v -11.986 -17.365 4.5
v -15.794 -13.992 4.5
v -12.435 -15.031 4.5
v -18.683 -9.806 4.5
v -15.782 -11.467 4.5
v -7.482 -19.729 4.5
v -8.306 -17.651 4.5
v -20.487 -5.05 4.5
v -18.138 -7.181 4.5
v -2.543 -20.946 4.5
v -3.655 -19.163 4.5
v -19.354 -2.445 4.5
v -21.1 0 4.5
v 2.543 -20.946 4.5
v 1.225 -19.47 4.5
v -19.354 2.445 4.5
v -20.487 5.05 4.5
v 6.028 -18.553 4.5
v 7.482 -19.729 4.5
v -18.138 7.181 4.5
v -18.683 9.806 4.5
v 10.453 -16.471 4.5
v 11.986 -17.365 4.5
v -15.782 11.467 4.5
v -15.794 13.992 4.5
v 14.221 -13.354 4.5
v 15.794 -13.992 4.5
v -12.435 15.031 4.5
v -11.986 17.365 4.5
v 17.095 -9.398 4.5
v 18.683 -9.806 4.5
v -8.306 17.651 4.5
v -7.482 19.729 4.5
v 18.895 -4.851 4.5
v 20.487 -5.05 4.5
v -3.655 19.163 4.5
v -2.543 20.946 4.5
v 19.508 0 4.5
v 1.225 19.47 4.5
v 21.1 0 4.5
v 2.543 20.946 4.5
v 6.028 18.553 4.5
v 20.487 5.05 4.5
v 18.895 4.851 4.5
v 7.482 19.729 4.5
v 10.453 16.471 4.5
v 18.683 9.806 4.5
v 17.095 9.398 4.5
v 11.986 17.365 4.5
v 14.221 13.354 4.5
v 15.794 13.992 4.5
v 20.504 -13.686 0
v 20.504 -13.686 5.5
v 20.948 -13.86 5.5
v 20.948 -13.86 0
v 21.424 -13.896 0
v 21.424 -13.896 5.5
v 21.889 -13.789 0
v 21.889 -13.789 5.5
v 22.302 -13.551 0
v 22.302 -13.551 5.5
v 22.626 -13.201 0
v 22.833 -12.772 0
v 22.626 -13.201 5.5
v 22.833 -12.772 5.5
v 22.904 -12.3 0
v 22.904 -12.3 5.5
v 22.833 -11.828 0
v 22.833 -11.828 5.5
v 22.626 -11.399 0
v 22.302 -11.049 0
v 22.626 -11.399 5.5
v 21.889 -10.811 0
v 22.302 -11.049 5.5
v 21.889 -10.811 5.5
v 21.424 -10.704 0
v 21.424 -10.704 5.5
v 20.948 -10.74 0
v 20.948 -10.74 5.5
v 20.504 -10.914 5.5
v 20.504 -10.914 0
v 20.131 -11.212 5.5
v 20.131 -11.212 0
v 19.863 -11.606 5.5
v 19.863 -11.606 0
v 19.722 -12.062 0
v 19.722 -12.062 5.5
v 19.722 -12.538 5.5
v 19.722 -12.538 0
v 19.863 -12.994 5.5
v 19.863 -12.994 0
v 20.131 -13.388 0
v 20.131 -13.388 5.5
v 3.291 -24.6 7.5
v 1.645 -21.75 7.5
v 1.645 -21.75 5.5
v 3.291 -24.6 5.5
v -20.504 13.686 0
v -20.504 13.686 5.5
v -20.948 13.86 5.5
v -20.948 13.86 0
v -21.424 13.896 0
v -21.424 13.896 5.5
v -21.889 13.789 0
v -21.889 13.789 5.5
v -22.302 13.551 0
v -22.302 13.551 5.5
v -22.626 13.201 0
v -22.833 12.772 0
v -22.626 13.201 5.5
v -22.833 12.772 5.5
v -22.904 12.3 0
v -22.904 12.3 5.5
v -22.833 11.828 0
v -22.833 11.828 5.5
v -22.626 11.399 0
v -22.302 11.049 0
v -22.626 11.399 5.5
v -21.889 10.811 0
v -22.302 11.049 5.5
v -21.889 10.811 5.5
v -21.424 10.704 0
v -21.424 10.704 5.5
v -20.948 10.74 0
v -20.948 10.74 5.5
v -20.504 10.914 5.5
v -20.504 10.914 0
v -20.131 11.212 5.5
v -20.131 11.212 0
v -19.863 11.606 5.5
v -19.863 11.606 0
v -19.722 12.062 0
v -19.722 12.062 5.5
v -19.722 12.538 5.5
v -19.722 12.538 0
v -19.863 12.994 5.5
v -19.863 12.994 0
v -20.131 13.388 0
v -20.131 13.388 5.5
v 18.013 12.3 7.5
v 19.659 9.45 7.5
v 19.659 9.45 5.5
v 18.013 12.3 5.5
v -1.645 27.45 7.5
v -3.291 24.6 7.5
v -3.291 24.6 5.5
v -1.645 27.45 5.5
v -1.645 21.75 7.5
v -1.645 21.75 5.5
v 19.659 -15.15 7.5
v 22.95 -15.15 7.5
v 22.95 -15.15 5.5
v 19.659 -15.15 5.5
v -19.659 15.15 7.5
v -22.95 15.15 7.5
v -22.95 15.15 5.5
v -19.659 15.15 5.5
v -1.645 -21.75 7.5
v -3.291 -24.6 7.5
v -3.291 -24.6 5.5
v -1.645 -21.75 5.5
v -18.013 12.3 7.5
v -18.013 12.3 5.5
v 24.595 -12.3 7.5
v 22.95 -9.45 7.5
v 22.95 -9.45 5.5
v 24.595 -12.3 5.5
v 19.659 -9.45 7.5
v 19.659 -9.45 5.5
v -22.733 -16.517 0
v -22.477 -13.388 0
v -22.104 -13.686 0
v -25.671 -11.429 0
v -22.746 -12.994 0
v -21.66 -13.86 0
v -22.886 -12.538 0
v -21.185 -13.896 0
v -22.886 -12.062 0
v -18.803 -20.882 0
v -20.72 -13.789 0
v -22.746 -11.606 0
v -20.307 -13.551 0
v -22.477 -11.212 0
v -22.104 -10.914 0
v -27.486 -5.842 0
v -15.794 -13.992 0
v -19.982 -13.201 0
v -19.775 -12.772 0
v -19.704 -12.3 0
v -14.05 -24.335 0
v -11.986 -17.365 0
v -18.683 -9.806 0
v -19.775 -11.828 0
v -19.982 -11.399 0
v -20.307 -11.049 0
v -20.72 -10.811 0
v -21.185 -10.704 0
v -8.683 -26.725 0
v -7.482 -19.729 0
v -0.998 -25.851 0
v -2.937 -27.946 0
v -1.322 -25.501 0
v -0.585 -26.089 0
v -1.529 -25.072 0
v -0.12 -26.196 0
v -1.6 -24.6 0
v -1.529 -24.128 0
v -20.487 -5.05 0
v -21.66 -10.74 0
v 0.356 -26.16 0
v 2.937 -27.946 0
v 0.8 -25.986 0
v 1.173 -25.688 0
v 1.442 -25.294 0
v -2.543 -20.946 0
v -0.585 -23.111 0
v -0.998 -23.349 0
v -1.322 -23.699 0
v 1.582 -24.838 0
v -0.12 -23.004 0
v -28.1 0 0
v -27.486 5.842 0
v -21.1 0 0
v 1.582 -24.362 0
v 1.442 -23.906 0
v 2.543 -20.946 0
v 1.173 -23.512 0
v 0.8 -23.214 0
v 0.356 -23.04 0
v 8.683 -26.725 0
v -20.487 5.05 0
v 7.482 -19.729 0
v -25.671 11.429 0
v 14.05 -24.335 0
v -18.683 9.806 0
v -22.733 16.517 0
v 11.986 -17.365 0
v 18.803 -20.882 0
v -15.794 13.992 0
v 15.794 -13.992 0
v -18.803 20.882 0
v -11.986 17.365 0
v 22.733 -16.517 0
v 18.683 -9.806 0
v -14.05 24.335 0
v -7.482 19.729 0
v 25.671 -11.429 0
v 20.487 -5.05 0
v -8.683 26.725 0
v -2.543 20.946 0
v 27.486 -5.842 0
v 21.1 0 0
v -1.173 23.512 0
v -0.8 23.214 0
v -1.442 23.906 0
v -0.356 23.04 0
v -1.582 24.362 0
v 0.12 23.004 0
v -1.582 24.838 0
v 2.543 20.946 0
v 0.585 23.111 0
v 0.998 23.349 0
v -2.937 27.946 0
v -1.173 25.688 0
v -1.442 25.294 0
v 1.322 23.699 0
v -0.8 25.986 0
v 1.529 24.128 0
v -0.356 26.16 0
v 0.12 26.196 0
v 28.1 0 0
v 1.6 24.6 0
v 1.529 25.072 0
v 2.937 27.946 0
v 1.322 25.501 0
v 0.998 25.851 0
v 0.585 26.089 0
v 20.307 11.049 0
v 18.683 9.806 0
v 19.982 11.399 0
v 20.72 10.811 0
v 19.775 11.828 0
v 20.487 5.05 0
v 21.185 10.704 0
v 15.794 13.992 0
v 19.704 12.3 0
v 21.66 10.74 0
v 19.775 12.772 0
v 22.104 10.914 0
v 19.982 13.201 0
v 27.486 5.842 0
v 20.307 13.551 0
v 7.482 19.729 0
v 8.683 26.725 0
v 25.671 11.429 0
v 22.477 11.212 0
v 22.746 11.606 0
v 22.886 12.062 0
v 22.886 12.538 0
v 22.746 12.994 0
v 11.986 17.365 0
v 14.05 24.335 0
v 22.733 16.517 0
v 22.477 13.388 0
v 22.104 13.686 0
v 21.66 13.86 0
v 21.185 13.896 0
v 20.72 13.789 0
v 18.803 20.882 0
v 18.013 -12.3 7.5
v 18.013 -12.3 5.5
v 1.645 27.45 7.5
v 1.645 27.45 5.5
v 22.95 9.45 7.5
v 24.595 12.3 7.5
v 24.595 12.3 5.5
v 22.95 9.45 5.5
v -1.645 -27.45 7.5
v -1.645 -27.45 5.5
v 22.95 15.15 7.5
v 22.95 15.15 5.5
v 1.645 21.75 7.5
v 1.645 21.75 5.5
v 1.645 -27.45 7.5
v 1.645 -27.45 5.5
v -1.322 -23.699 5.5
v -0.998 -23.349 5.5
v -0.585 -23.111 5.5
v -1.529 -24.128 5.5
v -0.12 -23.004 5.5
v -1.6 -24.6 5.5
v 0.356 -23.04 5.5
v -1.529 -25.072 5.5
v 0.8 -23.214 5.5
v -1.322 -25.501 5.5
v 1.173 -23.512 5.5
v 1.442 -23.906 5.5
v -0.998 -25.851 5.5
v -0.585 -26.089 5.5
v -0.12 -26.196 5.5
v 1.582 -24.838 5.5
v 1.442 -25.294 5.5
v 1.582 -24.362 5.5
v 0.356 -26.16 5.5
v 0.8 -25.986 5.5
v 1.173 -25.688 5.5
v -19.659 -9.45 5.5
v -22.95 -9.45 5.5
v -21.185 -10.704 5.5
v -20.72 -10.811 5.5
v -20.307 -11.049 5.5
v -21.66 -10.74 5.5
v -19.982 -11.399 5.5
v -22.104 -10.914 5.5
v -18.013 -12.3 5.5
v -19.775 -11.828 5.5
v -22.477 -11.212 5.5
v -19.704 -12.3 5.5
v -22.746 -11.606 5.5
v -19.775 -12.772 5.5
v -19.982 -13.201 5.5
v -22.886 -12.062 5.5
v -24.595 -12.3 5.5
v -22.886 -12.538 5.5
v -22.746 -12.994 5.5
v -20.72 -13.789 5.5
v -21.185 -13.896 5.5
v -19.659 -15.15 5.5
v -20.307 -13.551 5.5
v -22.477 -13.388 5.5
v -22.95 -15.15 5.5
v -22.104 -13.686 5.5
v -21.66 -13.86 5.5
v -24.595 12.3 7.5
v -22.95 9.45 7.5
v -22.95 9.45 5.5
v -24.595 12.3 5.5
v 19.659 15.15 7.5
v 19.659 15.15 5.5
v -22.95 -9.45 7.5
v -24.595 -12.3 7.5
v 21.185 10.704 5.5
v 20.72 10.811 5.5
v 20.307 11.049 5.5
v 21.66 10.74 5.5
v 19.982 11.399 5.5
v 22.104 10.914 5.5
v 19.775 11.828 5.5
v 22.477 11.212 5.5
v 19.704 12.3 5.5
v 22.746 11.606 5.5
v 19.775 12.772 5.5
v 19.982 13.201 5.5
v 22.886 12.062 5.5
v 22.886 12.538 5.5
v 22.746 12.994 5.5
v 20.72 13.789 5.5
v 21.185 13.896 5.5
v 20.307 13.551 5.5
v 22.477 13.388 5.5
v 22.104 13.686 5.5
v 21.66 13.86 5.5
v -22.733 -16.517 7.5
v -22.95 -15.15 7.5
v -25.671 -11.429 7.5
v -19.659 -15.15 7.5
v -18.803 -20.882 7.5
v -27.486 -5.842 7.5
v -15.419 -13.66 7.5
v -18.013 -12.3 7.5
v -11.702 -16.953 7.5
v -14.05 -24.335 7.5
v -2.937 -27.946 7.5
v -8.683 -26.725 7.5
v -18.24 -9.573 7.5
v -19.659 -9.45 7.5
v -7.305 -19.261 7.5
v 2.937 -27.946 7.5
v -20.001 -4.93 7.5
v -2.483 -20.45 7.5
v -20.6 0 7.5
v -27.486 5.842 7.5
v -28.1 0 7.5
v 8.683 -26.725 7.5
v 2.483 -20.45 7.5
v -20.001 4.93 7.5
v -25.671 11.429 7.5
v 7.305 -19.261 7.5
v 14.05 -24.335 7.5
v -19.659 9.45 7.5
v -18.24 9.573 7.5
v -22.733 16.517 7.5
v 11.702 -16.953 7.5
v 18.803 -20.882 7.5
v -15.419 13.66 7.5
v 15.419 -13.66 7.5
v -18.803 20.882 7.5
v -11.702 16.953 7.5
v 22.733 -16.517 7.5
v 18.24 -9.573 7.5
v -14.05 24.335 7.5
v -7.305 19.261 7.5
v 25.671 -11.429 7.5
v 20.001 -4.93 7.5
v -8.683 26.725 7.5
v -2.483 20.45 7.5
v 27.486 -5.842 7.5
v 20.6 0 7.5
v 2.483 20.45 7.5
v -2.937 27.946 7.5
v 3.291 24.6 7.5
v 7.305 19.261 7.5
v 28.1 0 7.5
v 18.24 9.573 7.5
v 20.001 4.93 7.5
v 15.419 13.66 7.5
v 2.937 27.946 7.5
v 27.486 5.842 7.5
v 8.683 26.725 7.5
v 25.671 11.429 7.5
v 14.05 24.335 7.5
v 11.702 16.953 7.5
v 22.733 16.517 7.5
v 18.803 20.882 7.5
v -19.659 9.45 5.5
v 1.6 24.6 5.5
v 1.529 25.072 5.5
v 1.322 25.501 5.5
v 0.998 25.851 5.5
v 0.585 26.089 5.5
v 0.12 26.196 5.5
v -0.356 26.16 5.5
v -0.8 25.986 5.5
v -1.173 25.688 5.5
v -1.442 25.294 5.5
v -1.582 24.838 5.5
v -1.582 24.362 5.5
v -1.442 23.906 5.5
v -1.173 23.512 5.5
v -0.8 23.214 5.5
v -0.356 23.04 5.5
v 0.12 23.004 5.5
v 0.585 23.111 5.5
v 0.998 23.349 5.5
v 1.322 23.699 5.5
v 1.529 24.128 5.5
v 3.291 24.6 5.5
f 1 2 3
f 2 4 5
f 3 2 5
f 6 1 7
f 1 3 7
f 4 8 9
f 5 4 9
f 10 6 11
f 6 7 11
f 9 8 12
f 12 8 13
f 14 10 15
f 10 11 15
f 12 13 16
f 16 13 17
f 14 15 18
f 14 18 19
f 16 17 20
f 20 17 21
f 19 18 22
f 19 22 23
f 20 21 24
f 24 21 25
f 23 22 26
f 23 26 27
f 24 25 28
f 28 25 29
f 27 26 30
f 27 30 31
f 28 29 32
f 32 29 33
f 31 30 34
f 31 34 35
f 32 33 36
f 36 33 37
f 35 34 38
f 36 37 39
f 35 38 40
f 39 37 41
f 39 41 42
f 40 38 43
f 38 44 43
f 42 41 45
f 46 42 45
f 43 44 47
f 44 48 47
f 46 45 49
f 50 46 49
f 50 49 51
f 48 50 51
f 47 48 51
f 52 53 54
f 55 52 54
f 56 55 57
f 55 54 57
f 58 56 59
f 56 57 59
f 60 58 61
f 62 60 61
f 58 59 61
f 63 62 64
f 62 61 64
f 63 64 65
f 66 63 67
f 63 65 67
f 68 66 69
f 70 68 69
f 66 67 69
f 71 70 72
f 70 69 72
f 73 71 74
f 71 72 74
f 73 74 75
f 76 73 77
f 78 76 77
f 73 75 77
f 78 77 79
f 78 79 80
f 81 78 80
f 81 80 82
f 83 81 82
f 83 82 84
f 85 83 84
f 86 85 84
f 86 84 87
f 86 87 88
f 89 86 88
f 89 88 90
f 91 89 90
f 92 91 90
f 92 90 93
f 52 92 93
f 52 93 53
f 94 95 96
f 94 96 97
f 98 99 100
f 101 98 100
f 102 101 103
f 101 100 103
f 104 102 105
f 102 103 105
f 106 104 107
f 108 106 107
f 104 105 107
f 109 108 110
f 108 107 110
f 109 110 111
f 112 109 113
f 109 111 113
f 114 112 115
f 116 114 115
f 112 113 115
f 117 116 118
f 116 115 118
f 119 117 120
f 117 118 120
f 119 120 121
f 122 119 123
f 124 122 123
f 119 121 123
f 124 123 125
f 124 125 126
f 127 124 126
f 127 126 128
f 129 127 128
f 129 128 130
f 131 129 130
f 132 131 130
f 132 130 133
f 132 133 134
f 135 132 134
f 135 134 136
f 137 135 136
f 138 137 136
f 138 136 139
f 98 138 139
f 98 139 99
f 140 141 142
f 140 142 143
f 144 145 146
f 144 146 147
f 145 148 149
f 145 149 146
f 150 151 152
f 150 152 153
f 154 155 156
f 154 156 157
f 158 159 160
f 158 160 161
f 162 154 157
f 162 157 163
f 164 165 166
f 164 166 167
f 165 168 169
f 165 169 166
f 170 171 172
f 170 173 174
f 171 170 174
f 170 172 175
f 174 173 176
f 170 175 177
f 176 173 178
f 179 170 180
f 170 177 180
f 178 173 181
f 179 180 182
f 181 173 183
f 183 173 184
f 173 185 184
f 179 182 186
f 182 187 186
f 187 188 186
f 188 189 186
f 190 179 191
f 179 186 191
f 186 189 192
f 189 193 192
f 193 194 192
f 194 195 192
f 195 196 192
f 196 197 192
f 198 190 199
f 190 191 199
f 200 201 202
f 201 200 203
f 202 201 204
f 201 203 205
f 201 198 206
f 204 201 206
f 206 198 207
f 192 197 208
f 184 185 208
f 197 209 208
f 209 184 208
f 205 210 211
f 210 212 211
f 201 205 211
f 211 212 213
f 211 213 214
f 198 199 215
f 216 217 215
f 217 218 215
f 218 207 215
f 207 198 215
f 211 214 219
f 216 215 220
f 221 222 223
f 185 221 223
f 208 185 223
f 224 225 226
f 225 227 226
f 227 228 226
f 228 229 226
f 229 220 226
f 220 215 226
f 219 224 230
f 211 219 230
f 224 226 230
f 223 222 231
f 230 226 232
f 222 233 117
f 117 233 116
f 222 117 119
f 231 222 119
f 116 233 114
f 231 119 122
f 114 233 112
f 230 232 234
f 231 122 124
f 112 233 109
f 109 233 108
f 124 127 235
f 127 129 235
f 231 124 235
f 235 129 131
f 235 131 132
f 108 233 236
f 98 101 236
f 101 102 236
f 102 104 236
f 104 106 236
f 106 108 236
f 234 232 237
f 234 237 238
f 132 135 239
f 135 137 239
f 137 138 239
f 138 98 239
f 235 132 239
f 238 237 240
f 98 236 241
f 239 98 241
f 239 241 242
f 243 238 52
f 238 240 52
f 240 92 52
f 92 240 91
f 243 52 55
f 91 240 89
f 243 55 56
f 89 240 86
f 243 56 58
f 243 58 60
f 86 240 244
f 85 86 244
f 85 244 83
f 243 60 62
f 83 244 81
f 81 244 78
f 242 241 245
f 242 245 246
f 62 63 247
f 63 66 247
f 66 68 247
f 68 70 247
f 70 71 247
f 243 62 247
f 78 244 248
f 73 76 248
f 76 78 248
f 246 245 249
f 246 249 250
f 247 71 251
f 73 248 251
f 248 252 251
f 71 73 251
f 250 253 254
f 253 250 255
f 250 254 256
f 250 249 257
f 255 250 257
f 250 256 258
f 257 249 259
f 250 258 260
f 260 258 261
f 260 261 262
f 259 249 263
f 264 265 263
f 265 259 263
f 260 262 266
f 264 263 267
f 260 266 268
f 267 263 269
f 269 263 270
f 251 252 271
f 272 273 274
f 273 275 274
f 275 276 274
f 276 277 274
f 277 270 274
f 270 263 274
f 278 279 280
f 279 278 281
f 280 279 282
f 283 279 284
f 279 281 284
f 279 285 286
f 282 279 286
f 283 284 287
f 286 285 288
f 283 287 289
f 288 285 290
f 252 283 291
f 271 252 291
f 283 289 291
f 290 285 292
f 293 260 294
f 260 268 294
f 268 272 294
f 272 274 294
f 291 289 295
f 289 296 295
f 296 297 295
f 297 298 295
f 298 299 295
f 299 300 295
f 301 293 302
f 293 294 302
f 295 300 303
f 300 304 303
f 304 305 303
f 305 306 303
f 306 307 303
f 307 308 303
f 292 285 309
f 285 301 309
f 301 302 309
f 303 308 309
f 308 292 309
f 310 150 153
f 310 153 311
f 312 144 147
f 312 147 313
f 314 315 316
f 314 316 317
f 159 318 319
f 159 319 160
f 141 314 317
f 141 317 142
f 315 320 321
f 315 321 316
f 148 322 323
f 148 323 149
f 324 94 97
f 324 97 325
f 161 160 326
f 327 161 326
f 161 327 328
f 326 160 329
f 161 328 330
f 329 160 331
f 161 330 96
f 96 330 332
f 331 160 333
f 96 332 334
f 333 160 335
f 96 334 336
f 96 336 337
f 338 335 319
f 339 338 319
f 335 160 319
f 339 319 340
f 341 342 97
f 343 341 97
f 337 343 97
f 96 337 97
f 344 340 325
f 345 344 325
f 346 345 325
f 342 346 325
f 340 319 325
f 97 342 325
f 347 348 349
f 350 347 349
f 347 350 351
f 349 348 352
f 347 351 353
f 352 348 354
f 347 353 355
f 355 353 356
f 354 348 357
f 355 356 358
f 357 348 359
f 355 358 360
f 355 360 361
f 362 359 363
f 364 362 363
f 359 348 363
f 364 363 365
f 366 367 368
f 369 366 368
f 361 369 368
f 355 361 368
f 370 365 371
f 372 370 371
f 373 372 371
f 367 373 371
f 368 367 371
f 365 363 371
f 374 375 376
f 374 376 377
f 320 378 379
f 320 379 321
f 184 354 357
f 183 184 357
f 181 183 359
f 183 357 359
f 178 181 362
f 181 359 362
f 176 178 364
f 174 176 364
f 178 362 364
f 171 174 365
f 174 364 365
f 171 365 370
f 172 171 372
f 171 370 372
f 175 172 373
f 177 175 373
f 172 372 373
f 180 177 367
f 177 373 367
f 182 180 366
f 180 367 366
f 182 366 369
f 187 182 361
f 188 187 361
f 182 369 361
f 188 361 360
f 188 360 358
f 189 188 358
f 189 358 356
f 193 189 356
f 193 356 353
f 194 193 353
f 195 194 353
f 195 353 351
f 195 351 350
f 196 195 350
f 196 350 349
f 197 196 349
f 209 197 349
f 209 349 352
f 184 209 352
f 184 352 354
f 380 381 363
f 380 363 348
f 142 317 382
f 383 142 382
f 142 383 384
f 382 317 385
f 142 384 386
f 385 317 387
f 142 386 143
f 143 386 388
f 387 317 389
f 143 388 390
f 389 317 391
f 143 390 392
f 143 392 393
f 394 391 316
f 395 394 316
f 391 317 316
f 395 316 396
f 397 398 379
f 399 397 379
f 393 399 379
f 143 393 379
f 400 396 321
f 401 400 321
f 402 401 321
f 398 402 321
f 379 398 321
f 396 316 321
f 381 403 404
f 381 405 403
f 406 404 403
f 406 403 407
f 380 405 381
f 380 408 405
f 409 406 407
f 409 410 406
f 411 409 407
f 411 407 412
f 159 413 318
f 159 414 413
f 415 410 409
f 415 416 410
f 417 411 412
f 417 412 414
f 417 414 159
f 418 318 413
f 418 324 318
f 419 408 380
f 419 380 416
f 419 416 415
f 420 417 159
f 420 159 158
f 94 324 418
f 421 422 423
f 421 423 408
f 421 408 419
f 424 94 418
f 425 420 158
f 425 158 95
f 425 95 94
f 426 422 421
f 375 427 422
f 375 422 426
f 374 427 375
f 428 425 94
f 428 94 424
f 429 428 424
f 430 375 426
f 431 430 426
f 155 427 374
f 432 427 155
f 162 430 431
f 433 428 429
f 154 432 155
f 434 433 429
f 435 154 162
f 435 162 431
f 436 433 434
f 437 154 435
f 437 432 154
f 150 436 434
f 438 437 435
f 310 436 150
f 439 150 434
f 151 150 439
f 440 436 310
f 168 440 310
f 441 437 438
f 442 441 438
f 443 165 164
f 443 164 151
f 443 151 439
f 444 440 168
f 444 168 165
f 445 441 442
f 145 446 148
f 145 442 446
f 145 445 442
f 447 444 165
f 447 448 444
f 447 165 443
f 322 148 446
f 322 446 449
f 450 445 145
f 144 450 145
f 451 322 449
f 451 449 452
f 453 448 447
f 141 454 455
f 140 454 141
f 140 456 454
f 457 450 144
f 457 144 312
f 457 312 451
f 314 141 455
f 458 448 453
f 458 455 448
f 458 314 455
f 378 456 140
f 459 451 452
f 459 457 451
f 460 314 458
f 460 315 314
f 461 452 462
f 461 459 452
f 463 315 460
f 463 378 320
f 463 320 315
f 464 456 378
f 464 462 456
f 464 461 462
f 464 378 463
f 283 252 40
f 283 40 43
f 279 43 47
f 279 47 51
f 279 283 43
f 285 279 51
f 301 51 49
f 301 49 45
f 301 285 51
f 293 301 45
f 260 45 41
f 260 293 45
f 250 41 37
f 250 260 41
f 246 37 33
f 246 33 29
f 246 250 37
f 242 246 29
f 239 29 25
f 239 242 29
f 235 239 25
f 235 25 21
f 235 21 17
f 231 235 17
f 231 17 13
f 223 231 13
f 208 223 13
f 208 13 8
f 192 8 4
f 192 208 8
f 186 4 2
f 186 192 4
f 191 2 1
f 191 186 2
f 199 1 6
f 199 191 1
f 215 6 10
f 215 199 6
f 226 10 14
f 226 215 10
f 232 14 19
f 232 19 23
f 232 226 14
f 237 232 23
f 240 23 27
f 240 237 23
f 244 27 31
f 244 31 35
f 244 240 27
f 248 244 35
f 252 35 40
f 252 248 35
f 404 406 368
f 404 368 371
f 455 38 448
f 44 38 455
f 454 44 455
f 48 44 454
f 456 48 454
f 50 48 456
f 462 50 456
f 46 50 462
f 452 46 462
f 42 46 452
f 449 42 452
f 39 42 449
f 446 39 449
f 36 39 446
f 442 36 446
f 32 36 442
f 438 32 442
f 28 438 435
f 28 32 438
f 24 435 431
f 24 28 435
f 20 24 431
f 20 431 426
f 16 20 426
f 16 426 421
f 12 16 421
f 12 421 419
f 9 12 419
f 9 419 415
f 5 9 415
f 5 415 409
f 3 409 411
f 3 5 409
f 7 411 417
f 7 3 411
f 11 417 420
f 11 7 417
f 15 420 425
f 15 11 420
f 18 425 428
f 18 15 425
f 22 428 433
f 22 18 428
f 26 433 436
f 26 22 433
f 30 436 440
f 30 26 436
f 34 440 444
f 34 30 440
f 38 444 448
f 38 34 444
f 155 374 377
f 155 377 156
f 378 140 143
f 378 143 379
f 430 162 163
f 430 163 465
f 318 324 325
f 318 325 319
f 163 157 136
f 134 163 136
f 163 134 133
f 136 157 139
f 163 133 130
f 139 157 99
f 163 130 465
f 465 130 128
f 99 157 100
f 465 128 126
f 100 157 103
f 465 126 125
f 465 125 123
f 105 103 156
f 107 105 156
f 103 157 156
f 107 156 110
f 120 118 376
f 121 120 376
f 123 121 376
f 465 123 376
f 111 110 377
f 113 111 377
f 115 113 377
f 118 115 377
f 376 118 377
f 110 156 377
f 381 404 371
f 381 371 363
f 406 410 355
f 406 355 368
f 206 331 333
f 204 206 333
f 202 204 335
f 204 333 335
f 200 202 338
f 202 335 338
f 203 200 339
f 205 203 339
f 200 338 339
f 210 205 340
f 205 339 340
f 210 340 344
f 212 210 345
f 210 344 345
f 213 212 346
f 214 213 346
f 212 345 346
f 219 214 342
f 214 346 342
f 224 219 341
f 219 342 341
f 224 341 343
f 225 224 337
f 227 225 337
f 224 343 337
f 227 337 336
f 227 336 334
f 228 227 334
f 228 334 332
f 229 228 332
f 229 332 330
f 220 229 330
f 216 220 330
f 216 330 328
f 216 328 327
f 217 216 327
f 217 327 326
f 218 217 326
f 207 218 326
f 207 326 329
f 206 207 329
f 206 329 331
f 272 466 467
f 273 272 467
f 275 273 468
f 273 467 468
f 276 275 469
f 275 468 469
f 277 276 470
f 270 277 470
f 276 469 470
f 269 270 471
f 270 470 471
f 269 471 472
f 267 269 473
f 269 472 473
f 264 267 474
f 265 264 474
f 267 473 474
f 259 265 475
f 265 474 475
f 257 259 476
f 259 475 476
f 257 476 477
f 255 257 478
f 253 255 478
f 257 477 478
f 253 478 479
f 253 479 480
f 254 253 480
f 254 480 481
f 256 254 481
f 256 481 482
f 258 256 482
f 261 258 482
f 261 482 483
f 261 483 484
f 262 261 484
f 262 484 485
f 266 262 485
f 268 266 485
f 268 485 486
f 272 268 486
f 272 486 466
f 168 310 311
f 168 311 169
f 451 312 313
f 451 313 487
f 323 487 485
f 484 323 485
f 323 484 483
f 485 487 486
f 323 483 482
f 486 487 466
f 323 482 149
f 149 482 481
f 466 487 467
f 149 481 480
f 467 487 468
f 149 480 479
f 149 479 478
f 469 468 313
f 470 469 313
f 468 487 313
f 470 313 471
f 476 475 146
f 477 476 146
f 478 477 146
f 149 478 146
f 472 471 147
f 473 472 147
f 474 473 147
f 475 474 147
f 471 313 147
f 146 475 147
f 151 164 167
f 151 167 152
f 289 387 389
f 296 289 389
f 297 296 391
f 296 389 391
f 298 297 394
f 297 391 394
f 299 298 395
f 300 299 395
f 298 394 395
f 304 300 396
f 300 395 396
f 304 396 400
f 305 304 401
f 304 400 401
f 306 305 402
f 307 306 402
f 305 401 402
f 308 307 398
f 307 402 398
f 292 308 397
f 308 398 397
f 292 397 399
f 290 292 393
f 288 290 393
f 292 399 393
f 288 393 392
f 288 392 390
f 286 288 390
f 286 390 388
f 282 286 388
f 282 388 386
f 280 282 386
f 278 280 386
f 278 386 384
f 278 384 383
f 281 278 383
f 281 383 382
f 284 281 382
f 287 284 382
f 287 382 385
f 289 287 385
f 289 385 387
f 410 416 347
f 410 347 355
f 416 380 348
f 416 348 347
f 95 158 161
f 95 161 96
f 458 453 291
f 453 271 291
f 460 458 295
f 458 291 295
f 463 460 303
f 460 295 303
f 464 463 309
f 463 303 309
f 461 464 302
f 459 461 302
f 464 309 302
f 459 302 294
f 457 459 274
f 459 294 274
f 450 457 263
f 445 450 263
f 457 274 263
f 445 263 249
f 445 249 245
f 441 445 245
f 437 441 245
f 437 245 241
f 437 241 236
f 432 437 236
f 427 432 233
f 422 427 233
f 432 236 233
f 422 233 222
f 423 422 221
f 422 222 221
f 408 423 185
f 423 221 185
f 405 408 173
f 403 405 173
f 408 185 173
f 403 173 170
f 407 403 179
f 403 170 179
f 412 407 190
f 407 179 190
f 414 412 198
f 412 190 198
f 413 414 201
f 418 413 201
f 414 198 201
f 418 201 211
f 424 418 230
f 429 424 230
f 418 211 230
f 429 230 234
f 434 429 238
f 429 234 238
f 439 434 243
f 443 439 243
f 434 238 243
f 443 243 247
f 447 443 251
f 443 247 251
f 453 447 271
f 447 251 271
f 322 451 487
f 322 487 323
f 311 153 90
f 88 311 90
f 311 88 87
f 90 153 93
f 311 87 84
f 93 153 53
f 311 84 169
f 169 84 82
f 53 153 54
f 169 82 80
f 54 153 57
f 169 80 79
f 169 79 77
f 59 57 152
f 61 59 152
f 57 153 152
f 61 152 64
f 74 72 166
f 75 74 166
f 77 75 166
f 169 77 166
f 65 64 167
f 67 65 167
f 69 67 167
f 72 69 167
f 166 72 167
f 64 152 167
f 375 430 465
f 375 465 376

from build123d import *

# Parameters (mm, degrees)
SKETCH1_R            = 28.1
SKETCH1_R_2          = 21.1
BOSS_EXTRUDE1_DEPTH  = 4.5
SKETCH2_R            = 28.1
SKETCH2_R_2          = 18.6
BOSS_EXTRUDE2_DEPTH  = 3
M3_CLEARANCE_HOLE1_D = 3.2
CUT_EXTRUDE1_DEPTH   = 2
CIRPATTERN1_COUNT    = 6
CHAMFER1_SIZE        = 2
CHAMFER1_SIZE_2      = 5.494954839


with BuildPart() as part:
    # Sketch1 → Boss-Extrude1 (new body)
    with BuildSketch(Plane.XY):
        Circle(SKETCH1_R)
        Circle(SKETCH1_R_2, mode=Mode.SUBTRACT)
    extrude(amount=BOSS_EXTRUDE1_DEPTH)

    # Sketch2 → Boss-Extrude2 (add)
    with BuildSketch(Plane.XY.offset(4.5)):
        Circle(SKETCH2_R)
        Circle(SKETCH2_R_2, mode=Mode.SUBTRACT)
    extrude(amount=BOSS_EXTRUDE2_DEPTH)

    # M3 Clearance Hole1 (through all)
    with Locations(Plane(origin=(0, 0, 0), x_dir=(-1, 0, 0), z_dir=(0, 0, -1))):
        with Locations((0, 24.6)):
            m3_clearance_hole1 = Hole(M3_CLEARANCE_HOLE1_D / 2)

    # Sketch5 → Cut-Extrude1 (cut)
    with BuildSketch(Plane.XY.offset(7.5)):
        Polygon((-1.645448267, 27.45), (1.645448267, 27.45), (3.290896534, 24.6), (1.645448267, 21.75), (-1.645448267, 21.75), (-3.290896534, 24.6), align=None)
    cut_extrude1 = extrude(amount=-CUT_EXTRUDE1_DEPTH, mode=Mode.SUBTRACT)

    # CirPattern1: M3 Clearance Hole1, Cut-Extrude1 ×6 about axis
    cirpattern1_axis = Axis((0, 0, 0), (0, 0, 1))
    add([m3_clearance_hole1.rotate(cirpattern1_axis, i * 360 / CIRPATTERN1_COUNT) for i in range(1, CIRPATTERN1_COUNT)], mode=Mode.SUBTRACT)
    add([cut_extrude1.rotate(cirpattern1_axis, i * 360 / CIRPATTERN1_COUNT) for i in range(1, CIRPATTERN1_COUNT)], mode=Mode.SUBTRACT)

    # Chamfer1
    # the kernel refuses this chamfer: 5.494954839, 2 mm, written as the material it takes off along each edge
    with BuildSketch(Plane(origin=(0, 0, 7.5), x_dir=(1, 0, 0), z_dir=(0, -1, 0))) as chamfer1_piece_1:
        Polygon((18.6 + CHAMFER1_SIZE, 0), (18.6, -CHAMFER1_SIZE_2), (18.6, 0), align=None)
    revolve(axis=Axis((0, 0, 7.5), (0, 0, 1)), mode=Mode.SUBTRACT)


solid = part.part
